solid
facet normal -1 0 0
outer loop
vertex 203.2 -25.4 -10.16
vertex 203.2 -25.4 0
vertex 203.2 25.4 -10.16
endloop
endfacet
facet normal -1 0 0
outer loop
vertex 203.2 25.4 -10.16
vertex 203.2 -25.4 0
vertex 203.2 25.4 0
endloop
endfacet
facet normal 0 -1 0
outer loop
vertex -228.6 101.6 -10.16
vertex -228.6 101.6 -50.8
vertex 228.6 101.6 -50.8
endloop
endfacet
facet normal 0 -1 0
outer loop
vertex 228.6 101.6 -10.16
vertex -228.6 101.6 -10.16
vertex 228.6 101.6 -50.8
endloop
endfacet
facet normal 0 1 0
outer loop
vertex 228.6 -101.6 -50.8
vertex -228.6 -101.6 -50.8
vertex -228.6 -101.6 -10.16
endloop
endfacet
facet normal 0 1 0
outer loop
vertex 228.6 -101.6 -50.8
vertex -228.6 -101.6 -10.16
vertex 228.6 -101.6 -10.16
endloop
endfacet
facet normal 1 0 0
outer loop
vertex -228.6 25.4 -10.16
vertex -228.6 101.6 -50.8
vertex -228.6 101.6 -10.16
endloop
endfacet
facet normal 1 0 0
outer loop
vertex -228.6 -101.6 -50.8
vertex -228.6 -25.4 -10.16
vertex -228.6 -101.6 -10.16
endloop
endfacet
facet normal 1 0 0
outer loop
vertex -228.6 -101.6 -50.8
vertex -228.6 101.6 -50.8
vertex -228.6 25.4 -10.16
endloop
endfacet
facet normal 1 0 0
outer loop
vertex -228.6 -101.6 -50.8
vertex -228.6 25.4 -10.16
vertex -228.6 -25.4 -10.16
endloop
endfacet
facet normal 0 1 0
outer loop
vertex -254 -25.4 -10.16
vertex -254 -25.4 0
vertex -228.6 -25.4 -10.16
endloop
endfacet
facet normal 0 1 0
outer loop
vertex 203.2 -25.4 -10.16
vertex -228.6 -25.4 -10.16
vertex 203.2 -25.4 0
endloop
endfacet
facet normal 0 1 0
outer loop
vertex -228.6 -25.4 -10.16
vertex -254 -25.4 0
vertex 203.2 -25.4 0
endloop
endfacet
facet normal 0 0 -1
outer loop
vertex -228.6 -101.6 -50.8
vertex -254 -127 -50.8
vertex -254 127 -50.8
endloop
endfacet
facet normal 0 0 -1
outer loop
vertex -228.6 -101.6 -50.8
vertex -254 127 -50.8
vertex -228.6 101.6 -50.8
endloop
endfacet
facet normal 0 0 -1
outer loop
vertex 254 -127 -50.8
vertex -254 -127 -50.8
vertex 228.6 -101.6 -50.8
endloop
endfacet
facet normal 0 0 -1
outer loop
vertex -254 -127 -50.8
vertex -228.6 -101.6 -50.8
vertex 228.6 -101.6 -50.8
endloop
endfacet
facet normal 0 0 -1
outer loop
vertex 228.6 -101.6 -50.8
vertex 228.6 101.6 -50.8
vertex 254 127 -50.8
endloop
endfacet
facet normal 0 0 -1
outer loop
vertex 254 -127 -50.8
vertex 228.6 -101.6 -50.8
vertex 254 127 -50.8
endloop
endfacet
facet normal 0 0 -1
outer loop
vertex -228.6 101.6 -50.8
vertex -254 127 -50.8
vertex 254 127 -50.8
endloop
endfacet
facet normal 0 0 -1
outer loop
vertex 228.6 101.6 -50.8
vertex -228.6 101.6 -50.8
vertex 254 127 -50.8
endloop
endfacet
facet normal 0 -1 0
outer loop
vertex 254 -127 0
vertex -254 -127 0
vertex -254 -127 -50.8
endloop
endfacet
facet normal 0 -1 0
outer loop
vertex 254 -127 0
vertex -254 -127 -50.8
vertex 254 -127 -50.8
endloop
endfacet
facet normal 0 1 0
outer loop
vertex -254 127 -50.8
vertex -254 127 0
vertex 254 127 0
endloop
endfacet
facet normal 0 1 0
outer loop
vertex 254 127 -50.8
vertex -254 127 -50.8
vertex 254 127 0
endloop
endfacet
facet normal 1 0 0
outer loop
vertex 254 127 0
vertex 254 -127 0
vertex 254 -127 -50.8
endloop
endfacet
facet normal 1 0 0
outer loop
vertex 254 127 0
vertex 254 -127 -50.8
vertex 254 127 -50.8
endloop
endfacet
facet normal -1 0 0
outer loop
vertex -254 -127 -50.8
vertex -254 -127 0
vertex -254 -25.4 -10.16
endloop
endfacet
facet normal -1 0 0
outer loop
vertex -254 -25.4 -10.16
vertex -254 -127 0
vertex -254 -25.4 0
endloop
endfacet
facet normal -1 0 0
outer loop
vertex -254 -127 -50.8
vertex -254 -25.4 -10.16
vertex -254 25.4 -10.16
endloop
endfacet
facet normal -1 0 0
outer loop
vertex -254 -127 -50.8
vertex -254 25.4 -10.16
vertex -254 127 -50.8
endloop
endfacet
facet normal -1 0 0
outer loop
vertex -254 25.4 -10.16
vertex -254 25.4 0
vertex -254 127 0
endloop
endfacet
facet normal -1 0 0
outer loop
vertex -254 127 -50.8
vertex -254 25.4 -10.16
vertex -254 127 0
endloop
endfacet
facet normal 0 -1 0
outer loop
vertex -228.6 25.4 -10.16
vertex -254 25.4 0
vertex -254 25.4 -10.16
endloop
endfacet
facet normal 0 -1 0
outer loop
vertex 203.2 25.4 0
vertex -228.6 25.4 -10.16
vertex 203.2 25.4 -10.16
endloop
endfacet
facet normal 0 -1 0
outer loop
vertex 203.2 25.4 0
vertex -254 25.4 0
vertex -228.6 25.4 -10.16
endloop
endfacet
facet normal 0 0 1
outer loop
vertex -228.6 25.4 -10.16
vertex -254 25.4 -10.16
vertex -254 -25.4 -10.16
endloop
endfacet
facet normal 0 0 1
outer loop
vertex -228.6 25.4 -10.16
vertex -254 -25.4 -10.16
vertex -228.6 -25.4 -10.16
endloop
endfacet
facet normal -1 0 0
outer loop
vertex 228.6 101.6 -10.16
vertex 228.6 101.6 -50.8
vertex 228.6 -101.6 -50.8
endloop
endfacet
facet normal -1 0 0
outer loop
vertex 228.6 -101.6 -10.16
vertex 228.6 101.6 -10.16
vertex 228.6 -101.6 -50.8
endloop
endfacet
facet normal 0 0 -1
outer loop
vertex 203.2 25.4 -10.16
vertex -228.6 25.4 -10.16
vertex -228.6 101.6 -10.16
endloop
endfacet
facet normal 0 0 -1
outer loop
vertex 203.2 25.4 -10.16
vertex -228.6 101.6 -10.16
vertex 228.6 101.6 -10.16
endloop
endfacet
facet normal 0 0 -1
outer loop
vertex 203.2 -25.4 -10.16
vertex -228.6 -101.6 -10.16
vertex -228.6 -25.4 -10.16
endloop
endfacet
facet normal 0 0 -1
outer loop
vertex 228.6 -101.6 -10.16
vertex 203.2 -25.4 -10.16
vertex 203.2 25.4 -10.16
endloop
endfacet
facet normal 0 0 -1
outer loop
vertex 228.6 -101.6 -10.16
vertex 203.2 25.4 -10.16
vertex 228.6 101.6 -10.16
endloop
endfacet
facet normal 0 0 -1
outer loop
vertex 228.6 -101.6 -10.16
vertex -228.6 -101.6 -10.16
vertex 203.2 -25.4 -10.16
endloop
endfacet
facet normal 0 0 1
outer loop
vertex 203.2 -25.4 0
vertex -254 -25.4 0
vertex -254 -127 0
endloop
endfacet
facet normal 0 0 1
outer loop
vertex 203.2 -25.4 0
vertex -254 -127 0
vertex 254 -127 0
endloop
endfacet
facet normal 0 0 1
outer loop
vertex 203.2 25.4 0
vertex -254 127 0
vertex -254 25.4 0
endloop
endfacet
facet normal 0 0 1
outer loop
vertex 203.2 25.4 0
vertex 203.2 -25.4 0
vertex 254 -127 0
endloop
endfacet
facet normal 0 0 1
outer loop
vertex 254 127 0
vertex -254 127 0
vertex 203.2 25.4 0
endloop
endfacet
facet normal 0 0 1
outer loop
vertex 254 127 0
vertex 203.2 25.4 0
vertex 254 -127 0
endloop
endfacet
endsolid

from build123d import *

# Parameters (mm, degrees)
F0_W     = 508
F0_H     = 254
F1_DEPTH = 50.8
F2_W     = 457.2
F2_H     = 203.2
F3_DEPTH = 40.64
F4_W     = 457.2
F4_H     = 50.8
F5_DEPTH = 10.16


with BuildPart() as f1:
    # F0 (on Top) → F1 (new body)
    with BuildSketch(Plane.XY):
        Rectangle(F0_W, F0_H)
    extrude(amount=-F1_DEPTH)

    # F2 (on face) → F3 (cut)
    with BuildSketch(Plane(origin=(0, 0, -50.8), x_dir=(1, 0, 0), z_dir=(0, 0, -1))):
        Rectangle(F2_W, F2_H)
    extrude(amount=-F3_DEPTH, mode=Mode.SUBTRACT)

    # F4 (on face) → F5 (cut)
    with BuildSketch(Plane.XY):
        with Locations((-25.4, 0)):
            Rectangle(F4_W, F4_H)
    extrude(amount=-F5_DEPTH, mode=Mode.SUBTRACT)


solid = f1.part
